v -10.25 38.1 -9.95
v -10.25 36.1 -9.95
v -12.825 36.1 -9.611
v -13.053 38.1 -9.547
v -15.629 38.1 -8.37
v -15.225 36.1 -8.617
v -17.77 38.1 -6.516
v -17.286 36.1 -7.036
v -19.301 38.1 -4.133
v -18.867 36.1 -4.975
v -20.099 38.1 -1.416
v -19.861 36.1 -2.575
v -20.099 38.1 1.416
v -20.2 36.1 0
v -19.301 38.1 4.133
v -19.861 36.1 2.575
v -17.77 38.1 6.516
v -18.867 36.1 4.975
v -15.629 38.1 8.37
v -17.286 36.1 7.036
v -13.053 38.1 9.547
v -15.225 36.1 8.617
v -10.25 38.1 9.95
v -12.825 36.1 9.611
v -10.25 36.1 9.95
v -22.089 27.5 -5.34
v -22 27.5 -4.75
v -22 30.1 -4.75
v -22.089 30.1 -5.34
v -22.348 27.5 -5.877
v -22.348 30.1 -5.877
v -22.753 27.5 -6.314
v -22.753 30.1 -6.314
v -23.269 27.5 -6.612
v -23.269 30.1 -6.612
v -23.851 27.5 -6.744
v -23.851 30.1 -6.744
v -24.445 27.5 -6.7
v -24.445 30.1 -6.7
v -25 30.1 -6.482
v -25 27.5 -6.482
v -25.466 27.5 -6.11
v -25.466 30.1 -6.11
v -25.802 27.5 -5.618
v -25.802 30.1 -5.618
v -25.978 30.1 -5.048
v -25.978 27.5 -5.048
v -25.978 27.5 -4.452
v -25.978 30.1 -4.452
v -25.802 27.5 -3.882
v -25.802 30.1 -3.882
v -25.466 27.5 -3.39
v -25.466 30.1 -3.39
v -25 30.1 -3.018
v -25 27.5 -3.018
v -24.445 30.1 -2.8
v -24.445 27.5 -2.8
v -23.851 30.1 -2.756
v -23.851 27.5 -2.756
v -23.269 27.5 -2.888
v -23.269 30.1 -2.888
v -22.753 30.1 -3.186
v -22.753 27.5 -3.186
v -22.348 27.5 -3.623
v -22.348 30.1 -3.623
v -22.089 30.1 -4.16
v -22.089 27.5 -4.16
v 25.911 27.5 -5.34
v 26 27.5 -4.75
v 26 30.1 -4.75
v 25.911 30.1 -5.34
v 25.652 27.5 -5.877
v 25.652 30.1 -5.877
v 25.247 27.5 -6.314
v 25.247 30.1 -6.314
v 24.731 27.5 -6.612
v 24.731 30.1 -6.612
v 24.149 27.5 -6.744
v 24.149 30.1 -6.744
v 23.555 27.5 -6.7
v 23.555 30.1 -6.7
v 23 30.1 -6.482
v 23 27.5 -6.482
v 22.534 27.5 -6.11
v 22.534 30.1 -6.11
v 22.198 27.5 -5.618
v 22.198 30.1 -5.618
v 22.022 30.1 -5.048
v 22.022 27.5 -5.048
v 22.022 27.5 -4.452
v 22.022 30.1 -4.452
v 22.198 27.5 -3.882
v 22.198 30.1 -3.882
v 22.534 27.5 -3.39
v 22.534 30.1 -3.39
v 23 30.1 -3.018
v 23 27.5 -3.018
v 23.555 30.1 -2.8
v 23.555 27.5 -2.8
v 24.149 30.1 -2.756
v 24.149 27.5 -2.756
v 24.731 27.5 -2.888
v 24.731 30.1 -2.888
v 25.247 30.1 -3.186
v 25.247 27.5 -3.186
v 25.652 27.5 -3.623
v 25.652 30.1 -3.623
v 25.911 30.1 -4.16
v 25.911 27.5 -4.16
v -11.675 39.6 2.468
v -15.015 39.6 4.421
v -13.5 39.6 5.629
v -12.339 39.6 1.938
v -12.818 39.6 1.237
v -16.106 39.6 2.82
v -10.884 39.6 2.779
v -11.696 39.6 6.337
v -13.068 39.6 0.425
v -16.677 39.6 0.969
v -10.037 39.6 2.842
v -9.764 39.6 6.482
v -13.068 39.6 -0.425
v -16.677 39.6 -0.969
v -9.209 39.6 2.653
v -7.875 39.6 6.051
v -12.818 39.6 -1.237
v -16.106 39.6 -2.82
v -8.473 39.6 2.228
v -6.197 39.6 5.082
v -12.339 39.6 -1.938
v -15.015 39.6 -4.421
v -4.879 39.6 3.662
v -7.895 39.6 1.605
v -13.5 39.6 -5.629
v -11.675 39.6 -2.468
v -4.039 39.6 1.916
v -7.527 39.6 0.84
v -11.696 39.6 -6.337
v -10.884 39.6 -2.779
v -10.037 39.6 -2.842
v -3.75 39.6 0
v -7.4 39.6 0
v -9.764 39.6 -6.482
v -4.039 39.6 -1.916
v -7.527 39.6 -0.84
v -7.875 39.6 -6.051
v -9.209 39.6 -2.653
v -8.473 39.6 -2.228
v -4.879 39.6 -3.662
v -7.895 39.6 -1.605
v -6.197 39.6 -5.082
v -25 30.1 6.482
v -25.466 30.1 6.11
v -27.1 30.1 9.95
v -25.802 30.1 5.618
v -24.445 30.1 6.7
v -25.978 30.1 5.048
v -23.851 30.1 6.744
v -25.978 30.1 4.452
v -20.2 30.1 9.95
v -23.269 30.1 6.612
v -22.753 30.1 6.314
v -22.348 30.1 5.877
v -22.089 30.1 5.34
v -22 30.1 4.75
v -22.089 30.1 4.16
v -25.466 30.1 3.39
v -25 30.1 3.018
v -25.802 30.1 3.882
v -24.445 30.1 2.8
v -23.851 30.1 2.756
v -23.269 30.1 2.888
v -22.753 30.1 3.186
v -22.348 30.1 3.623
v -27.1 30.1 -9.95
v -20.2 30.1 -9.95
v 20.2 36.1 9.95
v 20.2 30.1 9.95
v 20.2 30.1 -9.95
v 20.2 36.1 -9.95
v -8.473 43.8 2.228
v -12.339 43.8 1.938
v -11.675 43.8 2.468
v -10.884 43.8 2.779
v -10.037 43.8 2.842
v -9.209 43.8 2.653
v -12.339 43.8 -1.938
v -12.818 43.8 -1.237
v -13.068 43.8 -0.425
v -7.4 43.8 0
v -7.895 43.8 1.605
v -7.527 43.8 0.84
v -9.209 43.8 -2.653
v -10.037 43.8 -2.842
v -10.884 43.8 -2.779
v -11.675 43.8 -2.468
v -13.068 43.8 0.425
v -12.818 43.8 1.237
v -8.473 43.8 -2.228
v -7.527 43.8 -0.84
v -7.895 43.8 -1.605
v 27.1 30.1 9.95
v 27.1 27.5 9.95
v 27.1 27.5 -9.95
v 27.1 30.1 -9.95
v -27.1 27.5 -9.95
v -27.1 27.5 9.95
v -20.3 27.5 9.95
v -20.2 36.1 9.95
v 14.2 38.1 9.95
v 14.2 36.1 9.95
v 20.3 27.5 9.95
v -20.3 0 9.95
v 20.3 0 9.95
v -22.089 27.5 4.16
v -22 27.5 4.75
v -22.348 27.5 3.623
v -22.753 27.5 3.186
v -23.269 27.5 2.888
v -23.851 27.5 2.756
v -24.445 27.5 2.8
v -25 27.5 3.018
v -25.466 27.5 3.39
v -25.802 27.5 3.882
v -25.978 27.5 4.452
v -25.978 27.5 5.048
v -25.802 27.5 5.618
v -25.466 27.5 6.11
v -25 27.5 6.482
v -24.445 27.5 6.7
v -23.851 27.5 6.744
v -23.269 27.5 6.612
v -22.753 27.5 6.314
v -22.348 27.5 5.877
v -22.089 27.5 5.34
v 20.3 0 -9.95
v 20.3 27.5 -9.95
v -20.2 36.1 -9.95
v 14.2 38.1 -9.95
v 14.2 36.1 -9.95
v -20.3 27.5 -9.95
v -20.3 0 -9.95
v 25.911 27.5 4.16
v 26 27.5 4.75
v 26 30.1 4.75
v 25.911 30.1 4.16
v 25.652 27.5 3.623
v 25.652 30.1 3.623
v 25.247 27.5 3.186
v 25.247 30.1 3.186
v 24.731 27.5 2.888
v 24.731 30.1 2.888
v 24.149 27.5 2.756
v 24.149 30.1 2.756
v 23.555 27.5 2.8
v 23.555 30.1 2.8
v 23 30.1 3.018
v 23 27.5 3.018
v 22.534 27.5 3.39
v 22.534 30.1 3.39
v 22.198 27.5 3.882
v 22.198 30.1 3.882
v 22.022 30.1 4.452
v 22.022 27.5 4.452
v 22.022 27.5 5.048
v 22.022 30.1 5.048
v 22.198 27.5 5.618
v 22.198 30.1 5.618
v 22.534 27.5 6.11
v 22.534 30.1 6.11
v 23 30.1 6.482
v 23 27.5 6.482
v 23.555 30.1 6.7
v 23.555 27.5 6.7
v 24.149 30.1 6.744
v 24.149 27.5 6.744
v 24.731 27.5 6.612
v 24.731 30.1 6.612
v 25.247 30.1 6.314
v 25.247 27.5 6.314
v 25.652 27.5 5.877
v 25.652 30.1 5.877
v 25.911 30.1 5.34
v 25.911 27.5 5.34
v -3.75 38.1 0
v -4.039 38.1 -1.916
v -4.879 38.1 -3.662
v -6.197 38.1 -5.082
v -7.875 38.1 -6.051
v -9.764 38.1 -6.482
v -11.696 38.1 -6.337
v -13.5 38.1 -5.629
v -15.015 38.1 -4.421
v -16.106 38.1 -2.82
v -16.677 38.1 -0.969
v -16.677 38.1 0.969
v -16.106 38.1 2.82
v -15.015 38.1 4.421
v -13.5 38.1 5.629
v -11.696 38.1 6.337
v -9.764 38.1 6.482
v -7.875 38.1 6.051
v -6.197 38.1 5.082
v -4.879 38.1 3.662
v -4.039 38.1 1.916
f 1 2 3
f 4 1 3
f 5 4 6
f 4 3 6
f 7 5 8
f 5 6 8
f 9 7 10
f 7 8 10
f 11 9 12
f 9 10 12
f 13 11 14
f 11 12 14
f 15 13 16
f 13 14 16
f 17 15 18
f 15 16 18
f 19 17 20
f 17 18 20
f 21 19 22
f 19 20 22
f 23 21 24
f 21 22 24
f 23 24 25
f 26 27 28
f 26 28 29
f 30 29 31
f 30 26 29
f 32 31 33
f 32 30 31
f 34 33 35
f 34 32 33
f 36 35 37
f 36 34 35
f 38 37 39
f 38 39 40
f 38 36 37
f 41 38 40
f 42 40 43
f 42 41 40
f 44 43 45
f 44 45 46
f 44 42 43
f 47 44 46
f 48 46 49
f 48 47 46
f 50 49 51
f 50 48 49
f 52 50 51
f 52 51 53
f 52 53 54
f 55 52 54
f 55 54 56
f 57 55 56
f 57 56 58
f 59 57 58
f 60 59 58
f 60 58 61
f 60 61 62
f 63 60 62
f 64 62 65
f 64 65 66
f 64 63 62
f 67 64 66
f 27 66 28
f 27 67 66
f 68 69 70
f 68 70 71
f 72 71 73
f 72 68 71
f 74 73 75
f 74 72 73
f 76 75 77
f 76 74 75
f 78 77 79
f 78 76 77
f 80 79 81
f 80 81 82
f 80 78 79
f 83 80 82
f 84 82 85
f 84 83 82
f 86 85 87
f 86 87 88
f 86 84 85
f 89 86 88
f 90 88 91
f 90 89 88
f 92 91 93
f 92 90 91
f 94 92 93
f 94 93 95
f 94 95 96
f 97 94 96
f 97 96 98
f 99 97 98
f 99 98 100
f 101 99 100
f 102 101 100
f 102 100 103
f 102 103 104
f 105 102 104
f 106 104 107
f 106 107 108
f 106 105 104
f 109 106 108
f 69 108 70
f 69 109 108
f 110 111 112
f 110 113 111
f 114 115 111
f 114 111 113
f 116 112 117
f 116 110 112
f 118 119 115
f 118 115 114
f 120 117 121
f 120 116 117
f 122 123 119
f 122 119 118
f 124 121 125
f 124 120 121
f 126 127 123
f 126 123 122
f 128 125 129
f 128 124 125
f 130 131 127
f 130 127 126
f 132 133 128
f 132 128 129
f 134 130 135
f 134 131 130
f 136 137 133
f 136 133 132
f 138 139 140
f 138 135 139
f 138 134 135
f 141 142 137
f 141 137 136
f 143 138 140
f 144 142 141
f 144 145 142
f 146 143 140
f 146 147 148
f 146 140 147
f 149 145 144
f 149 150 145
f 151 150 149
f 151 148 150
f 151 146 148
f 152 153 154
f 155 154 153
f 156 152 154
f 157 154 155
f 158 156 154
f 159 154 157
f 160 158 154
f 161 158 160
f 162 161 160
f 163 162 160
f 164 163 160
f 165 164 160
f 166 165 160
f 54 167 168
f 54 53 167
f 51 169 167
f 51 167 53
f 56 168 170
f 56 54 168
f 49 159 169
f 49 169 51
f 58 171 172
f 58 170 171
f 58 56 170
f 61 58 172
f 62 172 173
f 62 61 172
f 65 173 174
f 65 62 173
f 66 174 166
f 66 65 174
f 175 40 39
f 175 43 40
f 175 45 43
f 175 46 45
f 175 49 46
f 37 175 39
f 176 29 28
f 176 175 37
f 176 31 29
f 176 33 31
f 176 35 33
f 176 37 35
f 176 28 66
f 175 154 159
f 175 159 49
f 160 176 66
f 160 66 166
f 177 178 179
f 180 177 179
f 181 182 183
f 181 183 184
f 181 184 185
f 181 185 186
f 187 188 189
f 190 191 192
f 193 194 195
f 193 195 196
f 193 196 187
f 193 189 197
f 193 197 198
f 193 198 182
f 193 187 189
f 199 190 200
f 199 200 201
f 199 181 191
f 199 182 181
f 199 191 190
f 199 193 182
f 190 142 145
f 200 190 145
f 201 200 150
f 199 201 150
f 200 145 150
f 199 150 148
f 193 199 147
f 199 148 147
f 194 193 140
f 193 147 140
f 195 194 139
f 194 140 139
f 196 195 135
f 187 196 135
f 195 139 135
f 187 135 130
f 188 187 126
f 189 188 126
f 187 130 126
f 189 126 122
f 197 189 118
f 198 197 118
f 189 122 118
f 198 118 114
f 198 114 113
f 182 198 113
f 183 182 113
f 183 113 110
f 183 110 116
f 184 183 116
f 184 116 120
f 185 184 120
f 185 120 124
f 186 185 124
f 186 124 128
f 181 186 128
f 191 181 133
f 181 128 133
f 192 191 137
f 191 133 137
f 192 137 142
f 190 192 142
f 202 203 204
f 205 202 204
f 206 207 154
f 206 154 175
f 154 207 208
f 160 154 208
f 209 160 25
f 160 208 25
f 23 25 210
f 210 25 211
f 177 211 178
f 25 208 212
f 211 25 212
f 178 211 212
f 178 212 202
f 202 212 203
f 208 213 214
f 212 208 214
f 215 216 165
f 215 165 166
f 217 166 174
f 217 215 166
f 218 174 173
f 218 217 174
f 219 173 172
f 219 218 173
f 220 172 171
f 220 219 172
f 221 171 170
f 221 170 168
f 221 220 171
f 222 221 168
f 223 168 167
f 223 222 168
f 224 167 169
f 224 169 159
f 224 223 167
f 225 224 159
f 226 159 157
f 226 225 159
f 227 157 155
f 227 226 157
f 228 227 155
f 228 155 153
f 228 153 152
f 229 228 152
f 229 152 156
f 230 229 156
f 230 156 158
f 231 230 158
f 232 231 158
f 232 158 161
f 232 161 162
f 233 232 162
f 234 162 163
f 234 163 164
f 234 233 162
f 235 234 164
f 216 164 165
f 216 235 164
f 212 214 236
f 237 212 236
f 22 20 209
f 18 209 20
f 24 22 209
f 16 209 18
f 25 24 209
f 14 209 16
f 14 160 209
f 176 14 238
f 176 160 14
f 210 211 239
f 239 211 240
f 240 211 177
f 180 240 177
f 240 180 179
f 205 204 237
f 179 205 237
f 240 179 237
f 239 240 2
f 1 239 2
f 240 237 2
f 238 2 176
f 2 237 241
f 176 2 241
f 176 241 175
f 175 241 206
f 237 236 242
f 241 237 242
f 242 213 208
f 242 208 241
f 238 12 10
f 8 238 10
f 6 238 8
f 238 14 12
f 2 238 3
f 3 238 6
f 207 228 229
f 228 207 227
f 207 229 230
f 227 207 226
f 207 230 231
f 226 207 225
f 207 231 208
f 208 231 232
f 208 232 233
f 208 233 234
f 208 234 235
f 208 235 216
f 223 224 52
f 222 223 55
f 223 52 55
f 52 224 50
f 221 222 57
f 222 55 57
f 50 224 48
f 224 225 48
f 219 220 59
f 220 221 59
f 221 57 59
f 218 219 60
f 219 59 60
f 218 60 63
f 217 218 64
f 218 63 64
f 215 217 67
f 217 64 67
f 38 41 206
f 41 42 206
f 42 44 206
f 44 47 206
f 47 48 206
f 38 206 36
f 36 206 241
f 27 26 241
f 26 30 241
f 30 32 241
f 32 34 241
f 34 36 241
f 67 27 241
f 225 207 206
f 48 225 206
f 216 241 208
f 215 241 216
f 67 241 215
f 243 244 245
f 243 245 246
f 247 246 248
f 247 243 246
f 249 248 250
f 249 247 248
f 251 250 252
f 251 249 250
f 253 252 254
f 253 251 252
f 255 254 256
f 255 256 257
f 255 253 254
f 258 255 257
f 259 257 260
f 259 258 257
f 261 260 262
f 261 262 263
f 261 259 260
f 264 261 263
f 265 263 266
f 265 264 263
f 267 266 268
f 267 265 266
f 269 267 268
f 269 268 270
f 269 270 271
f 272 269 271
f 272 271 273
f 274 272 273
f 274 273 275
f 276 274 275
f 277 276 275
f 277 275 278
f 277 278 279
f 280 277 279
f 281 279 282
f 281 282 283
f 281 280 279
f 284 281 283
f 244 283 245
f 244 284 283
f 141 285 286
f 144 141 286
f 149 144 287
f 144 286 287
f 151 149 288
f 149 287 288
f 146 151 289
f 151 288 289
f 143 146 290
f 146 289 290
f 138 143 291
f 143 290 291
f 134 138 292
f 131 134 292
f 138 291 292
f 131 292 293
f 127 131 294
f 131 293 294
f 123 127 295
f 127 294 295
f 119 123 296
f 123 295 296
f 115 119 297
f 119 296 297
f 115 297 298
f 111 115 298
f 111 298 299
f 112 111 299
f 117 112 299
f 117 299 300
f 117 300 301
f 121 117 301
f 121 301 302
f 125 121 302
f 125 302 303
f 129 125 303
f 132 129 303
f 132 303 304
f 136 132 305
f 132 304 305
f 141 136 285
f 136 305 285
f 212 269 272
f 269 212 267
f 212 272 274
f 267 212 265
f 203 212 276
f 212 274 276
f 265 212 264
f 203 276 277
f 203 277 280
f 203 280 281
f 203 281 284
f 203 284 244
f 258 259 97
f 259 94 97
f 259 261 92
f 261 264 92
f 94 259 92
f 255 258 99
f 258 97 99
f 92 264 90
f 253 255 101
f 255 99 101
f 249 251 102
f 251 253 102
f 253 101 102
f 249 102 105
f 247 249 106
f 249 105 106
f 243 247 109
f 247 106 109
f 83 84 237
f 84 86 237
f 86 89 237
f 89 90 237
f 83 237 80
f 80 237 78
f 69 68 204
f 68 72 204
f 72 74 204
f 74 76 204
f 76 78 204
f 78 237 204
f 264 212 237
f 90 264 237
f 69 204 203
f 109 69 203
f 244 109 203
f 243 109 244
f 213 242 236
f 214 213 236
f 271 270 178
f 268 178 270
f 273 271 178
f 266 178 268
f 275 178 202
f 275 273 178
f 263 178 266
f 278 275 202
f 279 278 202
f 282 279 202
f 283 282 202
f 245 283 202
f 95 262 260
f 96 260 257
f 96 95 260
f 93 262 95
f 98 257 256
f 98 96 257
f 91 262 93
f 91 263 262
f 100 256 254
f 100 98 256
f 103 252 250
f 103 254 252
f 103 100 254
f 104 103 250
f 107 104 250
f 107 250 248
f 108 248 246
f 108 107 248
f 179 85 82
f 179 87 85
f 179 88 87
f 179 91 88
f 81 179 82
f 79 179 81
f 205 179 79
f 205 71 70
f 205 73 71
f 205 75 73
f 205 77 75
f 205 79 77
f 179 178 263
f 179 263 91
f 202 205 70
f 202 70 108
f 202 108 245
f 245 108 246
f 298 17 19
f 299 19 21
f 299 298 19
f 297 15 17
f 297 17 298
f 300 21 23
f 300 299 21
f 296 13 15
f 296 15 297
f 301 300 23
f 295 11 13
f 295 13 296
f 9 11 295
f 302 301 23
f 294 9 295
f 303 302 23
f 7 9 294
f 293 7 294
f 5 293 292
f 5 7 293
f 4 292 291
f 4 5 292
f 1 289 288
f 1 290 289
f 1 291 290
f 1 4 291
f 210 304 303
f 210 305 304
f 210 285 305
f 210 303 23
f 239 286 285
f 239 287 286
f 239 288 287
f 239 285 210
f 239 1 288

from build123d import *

# Parameters (mm, degrees)
SKETCH1_W           = 40.6
SKETCH1_H           = 19.9
BOSS_EXTRUDE1_DEPTH = 27.5
SKETCH2_W           = 54.2
SKETCH2_H           = 19.9
SKETCH2_R           = 2
BOSS_EXTRUDE2_DEPTH = 2.6
SKETCH3_W           = 40.4
SKETCH3_H           = 19.9
BOSS_EXTRUDE3_DEPTH = 6
SKETCH4_R           = 9.95
BOSS_EXTRUDE4_DEPTH = 2
SKETCH5_R           = 6.5
BOSS_EXTRUDE5_DEPTH = 1.5
SKETCH6_R           = 2.85
BOSS_EXTRUDE6_DEPTH = 4.2


with BuildPart() as part:
    # Sketch1 → Boss-Extrude1 (new body)
    with BuildSketch(Plane(origin=(0, 0, 0), x_dir=(1, 0, 0), z_dir=(0, 1, 0))):
        Rectangle(SKETCH1_W, SKETCH1_H)
    extrude(amount=BOSS_EXTRUDE1_DEPTH)

    # Sketch2 → Boss-Extrude2 (add)
    with BuildSketch(Plane(origin=(0, 27.5, 0), x_dir=(1, 0, 0), z_dir=(0, 1, 0))):
        Rectangle(SKETCH2_W, SKETCH2_H)
        with Locations((-24, 4.75)):
            Circle(SKETCH2_R, mode=Mode.SUBTRACT)
        with Locations((-24, -4.75)):
            Circle(SKETCH2_R, mode=Mode.SUBTRACT)
        with Locations((24, -4.75)):
            Circle(SKETCH2_R, mode=Mode.SUBTRACT)
        with Locations((24, 4.75)):
            Circle(SKETCH2_R, mode=Mode.SUBTRACT)
    extrude(amount=BOSS_EXTRUDE2_DEPTH)

    # Sketch3 → Boss-Extrude3 (add)
    with BuildSketch(Plane(origin=(0, 30.1, 0), x_dir=(1, 0, 0), z_dir=(0, 1, 0))):
        Rectangle(SKETCH3_W, SKETCH3_H)
    extrude(amount=BOSS_EXTRUDE3_DEPTH)

    # Sketch4 → Boss-Extrude4 (add)
    with BuildSketch(Plane(origin=(0, 36.1, 0), x_dir=(1, 0, 0), z_dir=(0, 1, 0))):
        with BuildLine():
            Line((14.2, 9.95), (-10.25, 9.95))
            ThreePointArc((-10.25, 9.95), (-3.214287527, 7.035712473), (-0.3, 0))
            ThreePointArc((-0.3, 0), (-3.214287527, -7.035712473), (-10.25, -9.95))
            Line((-10.25, -9.95), (14.2, -9.95))
            Line((14.2, -9.95), (14.2, 9.95))
        make_face()
        with Locations((-10.25, 0)):
            Circle(SKETCH4_R)
    extrude(amount=BOSS_EXTRUDE4_DEPTH)

    # Sketch5 → Boss-Extrude5 (add)
    with BuildSketch(Plane(origin=(0, 38.1, 0), x_dir=(1, 0, 0), z_dir=(0, 1, 0))):
        with Locations((-10.25, 0)):
            Circle(SKETCH5_R)
    extrude(amount=BOSS_EXTRUDE5_DEPTH)

    # Sketch6 → Boss-Extrude6 (add)
    with BuildSketch(Plane(origin=(0, 39.6, 0), x_dir=(1, 0, 0), z_dir=(0, 1, 0))):
        with Locations((-10.25, 0)):
            Circle(SKETCH6_R)
    extrude(amount=BOSS_EXTRUDE6_DEPTH)


solid = part.part
